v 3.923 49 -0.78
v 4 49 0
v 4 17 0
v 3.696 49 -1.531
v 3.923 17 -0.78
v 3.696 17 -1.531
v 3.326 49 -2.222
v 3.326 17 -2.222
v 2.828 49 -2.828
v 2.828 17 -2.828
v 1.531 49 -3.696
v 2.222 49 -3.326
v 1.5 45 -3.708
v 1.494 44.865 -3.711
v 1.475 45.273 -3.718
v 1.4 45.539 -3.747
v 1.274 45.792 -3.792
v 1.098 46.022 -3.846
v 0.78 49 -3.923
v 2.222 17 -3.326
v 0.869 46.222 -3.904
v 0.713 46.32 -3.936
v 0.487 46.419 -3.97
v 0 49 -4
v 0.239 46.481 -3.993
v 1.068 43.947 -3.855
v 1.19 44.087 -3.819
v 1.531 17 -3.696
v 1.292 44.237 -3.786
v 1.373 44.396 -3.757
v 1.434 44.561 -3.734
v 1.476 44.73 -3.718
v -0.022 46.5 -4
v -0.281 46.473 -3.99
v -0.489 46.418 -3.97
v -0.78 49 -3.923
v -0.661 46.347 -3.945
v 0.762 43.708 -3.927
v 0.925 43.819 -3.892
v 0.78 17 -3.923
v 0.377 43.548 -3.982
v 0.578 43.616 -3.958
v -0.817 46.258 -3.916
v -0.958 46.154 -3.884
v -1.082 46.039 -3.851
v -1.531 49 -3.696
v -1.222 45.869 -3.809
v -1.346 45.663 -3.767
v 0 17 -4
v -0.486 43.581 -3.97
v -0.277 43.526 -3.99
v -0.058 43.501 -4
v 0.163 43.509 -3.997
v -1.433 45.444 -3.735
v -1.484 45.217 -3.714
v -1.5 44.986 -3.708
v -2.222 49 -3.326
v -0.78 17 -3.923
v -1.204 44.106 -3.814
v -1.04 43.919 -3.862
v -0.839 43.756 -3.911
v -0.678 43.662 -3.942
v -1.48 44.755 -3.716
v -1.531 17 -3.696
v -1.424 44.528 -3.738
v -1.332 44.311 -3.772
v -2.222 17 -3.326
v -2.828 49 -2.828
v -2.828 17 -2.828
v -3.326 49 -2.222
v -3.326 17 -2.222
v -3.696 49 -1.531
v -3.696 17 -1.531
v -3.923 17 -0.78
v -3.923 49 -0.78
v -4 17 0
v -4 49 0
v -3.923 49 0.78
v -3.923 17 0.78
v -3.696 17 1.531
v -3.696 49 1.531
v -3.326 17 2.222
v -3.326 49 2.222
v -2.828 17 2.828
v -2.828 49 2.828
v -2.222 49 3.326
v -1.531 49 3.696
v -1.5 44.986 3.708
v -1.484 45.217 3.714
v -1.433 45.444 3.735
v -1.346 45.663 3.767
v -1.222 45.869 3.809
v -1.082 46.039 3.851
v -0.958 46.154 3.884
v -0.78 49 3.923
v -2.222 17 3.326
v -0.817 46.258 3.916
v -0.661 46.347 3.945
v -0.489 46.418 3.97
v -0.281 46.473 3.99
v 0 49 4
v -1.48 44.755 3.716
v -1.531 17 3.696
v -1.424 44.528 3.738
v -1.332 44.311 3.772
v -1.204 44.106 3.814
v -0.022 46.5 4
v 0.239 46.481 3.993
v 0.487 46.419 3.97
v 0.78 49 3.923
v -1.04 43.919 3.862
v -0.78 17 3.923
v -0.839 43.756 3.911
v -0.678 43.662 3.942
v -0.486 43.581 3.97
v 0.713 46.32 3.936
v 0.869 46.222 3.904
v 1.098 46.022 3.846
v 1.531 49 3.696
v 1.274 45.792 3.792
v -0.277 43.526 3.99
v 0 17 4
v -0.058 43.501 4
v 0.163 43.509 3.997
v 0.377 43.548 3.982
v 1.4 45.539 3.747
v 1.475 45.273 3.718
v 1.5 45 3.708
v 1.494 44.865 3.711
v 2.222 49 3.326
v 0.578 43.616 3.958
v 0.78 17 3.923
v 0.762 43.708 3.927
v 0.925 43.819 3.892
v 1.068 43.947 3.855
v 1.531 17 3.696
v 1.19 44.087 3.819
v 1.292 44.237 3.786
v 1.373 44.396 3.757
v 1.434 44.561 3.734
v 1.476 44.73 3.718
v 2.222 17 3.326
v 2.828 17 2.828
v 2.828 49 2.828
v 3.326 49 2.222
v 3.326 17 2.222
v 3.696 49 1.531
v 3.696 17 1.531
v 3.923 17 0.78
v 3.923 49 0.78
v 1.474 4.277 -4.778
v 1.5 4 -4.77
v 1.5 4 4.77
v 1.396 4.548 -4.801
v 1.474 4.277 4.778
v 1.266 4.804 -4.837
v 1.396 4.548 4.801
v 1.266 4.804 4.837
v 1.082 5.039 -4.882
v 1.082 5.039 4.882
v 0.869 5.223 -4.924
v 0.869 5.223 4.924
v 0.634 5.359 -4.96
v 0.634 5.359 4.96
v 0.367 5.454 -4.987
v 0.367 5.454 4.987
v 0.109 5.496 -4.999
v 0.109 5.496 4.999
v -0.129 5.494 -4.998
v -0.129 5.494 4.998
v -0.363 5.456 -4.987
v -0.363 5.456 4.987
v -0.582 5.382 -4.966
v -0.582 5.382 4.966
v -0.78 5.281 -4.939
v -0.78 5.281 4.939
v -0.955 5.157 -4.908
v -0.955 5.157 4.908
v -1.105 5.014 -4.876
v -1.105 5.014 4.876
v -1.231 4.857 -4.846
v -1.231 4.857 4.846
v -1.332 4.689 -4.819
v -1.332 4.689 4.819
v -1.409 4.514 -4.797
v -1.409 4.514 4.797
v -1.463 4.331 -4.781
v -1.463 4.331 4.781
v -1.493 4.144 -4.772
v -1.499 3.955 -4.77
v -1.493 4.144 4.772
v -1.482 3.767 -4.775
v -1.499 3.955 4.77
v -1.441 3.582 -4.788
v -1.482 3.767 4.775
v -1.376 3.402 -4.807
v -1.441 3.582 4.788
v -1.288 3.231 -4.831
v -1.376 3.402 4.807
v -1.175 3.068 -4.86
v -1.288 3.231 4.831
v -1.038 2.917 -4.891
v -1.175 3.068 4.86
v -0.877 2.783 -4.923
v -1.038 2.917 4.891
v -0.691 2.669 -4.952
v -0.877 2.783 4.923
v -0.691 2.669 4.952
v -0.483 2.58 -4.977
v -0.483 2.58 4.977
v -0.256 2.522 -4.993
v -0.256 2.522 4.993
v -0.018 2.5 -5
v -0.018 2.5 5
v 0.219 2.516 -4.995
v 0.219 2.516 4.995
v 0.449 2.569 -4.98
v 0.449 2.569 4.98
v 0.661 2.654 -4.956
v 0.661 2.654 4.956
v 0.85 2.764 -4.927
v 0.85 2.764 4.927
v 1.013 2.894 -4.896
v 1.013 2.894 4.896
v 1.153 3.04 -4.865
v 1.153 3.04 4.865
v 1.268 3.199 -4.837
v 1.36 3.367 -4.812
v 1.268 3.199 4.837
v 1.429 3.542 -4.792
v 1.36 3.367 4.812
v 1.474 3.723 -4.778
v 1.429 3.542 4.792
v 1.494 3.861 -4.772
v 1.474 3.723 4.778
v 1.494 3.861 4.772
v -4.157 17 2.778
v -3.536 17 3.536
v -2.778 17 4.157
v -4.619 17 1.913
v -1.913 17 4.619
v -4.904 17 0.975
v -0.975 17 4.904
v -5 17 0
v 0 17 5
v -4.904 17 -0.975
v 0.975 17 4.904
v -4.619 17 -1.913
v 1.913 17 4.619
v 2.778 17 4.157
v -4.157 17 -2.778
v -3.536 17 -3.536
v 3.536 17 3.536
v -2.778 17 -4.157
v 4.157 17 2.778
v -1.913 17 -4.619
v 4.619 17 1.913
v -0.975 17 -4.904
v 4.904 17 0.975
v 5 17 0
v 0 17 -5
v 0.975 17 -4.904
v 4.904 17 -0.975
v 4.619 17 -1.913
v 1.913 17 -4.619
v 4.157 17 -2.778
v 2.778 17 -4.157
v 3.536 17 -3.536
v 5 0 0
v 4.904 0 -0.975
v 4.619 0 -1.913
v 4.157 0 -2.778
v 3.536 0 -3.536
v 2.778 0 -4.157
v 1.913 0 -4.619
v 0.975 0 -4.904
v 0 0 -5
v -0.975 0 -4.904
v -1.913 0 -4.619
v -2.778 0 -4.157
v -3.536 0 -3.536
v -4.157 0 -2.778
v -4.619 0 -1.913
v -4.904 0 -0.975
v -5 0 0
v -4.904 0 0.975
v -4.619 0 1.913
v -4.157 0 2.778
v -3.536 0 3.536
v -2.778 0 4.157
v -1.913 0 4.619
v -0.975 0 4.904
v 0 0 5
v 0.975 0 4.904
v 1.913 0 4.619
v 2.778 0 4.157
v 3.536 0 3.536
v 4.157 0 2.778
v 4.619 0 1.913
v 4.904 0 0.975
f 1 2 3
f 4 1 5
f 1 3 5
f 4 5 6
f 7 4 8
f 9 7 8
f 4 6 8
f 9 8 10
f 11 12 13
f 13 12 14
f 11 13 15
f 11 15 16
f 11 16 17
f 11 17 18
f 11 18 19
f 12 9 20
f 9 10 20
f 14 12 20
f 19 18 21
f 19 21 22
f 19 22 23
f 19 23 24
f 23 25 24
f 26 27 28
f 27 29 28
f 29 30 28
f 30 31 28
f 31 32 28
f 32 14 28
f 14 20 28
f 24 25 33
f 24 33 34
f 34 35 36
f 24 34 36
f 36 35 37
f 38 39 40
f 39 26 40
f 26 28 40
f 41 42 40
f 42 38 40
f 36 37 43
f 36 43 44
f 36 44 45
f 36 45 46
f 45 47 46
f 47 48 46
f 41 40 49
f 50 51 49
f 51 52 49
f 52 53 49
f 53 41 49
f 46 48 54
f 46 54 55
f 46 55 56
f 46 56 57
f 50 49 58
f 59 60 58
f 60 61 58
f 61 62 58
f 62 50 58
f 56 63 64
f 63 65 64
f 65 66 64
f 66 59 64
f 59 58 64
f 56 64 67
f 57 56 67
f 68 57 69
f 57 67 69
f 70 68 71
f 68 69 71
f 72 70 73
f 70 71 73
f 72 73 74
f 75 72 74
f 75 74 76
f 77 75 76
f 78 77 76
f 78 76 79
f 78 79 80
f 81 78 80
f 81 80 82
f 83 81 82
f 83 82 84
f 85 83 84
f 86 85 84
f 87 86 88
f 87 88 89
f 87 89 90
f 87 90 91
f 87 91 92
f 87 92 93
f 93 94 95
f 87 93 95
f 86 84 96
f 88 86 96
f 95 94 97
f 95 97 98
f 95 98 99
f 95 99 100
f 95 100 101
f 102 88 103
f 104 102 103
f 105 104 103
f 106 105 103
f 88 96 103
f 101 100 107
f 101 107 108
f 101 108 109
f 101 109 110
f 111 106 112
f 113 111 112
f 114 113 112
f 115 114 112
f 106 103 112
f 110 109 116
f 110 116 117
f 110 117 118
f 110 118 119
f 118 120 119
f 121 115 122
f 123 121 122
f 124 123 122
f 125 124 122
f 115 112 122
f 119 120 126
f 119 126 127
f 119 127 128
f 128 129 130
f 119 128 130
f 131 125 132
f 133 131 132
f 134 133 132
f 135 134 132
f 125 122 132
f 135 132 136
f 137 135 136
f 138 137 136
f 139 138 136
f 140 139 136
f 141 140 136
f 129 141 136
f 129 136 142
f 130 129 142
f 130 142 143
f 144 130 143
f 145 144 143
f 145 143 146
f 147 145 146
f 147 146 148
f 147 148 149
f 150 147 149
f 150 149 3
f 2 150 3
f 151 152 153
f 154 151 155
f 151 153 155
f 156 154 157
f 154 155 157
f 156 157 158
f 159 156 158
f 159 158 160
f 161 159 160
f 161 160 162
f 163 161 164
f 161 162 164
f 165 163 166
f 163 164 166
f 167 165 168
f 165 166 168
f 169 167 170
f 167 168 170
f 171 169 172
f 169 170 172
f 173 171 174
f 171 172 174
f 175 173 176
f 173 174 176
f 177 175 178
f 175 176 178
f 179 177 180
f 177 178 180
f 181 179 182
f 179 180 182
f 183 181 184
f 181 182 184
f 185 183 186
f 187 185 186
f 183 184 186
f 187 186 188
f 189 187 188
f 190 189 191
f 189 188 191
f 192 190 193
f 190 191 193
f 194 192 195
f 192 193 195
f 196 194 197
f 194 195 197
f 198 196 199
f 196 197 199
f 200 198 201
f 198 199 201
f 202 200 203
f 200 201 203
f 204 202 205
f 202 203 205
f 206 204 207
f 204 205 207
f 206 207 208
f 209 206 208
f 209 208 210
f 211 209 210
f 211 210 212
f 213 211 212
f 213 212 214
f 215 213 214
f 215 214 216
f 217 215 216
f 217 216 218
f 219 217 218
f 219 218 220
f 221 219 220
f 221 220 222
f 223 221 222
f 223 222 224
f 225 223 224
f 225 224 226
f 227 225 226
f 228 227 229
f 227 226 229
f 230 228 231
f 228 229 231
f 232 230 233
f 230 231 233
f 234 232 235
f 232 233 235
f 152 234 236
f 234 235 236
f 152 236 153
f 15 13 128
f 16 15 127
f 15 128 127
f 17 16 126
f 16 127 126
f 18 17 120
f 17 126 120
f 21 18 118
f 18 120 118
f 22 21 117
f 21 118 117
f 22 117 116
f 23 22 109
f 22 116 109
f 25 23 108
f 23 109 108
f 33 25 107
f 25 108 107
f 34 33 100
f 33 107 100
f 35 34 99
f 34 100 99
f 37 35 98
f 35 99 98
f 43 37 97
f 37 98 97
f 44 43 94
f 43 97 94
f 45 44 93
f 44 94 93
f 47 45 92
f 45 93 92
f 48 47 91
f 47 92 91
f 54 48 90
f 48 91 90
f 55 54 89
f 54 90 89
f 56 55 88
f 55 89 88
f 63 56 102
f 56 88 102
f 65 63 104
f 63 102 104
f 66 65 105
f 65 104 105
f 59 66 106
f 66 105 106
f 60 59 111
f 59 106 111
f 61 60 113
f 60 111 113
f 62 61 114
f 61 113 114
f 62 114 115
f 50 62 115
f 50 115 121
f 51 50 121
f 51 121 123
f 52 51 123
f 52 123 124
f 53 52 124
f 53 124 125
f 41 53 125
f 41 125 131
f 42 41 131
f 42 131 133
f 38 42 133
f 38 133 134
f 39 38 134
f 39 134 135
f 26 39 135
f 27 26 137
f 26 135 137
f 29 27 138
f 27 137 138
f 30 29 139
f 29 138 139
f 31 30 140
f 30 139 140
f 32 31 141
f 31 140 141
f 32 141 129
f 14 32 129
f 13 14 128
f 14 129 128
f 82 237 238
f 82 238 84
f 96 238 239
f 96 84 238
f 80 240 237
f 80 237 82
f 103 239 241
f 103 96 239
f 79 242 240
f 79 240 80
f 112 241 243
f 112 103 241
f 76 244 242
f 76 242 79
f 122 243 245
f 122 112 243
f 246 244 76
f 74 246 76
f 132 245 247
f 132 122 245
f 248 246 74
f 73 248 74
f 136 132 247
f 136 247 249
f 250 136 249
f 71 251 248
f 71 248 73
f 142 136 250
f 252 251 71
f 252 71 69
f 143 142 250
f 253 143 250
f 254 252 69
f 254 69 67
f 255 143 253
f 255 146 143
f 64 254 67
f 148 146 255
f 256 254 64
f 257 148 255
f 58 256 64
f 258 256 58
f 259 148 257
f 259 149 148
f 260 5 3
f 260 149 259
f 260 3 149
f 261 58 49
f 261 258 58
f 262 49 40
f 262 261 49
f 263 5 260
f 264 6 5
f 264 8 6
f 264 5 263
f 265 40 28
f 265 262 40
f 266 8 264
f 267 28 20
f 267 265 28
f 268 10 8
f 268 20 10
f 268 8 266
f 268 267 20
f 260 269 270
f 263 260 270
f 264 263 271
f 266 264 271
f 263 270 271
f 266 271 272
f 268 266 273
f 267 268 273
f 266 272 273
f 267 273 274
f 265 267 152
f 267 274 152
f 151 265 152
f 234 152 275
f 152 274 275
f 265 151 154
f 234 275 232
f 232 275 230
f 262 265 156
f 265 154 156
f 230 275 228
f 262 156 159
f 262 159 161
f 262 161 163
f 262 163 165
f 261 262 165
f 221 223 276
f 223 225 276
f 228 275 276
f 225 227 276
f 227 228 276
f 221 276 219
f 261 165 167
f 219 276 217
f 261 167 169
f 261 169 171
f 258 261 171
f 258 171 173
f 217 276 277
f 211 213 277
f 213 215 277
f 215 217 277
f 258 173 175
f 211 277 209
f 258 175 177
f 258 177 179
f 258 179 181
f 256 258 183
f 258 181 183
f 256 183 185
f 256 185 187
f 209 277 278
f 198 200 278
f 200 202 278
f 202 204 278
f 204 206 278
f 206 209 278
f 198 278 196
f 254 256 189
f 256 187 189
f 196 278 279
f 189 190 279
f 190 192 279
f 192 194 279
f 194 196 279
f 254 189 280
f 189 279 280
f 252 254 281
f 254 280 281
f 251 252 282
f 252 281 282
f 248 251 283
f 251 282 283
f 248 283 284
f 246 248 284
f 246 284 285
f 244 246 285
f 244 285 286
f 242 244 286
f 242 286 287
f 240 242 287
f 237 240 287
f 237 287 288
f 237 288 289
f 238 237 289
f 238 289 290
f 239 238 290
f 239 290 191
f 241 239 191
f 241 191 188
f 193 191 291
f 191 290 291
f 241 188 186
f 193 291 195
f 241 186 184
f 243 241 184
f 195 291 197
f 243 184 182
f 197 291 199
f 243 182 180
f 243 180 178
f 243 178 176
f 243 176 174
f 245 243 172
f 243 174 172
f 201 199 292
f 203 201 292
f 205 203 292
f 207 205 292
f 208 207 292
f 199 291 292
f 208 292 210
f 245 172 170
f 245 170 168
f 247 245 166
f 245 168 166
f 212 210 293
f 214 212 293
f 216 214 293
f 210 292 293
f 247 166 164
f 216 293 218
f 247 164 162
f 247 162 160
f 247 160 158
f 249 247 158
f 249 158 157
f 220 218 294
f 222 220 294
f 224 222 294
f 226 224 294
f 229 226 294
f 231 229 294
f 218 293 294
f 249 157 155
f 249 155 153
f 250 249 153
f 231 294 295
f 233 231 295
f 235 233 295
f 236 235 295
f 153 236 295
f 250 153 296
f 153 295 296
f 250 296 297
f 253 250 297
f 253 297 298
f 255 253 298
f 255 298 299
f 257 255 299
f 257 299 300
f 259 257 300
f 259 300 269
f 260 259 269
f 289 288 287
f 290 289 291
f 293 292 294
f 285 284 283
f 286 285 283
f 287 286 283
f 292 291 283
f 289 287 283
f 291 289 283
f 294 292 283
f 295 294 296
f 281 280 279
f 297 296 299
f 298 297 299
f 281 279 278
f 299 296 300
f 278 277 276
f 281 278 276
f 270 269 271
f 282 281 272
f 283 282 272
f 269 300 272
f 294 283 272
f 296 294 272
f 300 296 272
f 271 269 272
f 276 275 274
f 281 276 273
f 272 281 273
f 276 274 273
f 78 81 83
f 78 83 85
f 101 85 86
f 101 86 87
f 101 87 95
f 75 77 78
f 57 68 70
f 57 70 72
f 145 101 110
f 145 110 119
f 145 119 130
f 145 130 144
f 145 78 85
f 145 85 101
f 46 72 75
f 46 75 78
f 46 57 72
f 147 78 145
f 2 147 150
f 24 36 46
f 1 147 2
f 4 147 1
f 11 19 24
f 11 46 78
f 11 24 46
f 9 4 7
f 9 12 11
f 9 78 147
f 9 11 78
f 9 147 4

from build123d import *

# Parameters (mm, degrees)
SKETCH1_R               = 4
SKETCH1_R_2             = 5
BOSS_EXTRUDE1_DEPTH     = 17
SKETCH1_3_R             = 4
BOSS_EXTRUDE2_DEPTH     = 49
SKETCH2_R               = 1.5
CUT_EXTRUDE1_DEPTH      = 6
CUT_EXTRUDE1_DEPTH_BACK = 6


with BuildPart() as part:
    # Sketch1 → Boss-Extrude1 (new body)
    with BuildSketch(Plane(origin=(0, 0, 0), x_dir=(1, 0, 0), z_dir=(0, 1, 0))):
        Circle(SKETCH1_R)
        Circle(SKETCH1_R_2)
        Circle(SKETCH1_R, mode=Mode.SUBTRACT)
    extrude(amount=BOSS_EXTRUDE1_DEPTH)

    # Sketch1<3> → Boss-Extrude2 (add)
    with BuildSketch(Plane(origin=(0, 0, 0), x_dir=(1, 0, 0), z_dir=(0, 1, 0))):
        Circle(SKETCH1_3_R)
    extrude(amount=BOSS_EXTRUDE2_DEPTH)

    # Sketch2 → Cut-Extrude1 (cut, two sides)
    with BuildSketch(Plane.XY) as cut_extrude1_sk:
        with Locations((0, 45)):
            Circle(SKETCH2_R)
        with Locations((0, 4)):
            Circle(SKETCH2_R)
    extrude(amount=CUT_EXTRUDE1_DEPTH, mode=Mode.SUBTRACT)
    extrude(cut_extrude1_sk.sketch, amount=-CUT_EXTRUDE1_DEPTH_BACK, mode=Mode.SUBTRACT)


solid = part.part
